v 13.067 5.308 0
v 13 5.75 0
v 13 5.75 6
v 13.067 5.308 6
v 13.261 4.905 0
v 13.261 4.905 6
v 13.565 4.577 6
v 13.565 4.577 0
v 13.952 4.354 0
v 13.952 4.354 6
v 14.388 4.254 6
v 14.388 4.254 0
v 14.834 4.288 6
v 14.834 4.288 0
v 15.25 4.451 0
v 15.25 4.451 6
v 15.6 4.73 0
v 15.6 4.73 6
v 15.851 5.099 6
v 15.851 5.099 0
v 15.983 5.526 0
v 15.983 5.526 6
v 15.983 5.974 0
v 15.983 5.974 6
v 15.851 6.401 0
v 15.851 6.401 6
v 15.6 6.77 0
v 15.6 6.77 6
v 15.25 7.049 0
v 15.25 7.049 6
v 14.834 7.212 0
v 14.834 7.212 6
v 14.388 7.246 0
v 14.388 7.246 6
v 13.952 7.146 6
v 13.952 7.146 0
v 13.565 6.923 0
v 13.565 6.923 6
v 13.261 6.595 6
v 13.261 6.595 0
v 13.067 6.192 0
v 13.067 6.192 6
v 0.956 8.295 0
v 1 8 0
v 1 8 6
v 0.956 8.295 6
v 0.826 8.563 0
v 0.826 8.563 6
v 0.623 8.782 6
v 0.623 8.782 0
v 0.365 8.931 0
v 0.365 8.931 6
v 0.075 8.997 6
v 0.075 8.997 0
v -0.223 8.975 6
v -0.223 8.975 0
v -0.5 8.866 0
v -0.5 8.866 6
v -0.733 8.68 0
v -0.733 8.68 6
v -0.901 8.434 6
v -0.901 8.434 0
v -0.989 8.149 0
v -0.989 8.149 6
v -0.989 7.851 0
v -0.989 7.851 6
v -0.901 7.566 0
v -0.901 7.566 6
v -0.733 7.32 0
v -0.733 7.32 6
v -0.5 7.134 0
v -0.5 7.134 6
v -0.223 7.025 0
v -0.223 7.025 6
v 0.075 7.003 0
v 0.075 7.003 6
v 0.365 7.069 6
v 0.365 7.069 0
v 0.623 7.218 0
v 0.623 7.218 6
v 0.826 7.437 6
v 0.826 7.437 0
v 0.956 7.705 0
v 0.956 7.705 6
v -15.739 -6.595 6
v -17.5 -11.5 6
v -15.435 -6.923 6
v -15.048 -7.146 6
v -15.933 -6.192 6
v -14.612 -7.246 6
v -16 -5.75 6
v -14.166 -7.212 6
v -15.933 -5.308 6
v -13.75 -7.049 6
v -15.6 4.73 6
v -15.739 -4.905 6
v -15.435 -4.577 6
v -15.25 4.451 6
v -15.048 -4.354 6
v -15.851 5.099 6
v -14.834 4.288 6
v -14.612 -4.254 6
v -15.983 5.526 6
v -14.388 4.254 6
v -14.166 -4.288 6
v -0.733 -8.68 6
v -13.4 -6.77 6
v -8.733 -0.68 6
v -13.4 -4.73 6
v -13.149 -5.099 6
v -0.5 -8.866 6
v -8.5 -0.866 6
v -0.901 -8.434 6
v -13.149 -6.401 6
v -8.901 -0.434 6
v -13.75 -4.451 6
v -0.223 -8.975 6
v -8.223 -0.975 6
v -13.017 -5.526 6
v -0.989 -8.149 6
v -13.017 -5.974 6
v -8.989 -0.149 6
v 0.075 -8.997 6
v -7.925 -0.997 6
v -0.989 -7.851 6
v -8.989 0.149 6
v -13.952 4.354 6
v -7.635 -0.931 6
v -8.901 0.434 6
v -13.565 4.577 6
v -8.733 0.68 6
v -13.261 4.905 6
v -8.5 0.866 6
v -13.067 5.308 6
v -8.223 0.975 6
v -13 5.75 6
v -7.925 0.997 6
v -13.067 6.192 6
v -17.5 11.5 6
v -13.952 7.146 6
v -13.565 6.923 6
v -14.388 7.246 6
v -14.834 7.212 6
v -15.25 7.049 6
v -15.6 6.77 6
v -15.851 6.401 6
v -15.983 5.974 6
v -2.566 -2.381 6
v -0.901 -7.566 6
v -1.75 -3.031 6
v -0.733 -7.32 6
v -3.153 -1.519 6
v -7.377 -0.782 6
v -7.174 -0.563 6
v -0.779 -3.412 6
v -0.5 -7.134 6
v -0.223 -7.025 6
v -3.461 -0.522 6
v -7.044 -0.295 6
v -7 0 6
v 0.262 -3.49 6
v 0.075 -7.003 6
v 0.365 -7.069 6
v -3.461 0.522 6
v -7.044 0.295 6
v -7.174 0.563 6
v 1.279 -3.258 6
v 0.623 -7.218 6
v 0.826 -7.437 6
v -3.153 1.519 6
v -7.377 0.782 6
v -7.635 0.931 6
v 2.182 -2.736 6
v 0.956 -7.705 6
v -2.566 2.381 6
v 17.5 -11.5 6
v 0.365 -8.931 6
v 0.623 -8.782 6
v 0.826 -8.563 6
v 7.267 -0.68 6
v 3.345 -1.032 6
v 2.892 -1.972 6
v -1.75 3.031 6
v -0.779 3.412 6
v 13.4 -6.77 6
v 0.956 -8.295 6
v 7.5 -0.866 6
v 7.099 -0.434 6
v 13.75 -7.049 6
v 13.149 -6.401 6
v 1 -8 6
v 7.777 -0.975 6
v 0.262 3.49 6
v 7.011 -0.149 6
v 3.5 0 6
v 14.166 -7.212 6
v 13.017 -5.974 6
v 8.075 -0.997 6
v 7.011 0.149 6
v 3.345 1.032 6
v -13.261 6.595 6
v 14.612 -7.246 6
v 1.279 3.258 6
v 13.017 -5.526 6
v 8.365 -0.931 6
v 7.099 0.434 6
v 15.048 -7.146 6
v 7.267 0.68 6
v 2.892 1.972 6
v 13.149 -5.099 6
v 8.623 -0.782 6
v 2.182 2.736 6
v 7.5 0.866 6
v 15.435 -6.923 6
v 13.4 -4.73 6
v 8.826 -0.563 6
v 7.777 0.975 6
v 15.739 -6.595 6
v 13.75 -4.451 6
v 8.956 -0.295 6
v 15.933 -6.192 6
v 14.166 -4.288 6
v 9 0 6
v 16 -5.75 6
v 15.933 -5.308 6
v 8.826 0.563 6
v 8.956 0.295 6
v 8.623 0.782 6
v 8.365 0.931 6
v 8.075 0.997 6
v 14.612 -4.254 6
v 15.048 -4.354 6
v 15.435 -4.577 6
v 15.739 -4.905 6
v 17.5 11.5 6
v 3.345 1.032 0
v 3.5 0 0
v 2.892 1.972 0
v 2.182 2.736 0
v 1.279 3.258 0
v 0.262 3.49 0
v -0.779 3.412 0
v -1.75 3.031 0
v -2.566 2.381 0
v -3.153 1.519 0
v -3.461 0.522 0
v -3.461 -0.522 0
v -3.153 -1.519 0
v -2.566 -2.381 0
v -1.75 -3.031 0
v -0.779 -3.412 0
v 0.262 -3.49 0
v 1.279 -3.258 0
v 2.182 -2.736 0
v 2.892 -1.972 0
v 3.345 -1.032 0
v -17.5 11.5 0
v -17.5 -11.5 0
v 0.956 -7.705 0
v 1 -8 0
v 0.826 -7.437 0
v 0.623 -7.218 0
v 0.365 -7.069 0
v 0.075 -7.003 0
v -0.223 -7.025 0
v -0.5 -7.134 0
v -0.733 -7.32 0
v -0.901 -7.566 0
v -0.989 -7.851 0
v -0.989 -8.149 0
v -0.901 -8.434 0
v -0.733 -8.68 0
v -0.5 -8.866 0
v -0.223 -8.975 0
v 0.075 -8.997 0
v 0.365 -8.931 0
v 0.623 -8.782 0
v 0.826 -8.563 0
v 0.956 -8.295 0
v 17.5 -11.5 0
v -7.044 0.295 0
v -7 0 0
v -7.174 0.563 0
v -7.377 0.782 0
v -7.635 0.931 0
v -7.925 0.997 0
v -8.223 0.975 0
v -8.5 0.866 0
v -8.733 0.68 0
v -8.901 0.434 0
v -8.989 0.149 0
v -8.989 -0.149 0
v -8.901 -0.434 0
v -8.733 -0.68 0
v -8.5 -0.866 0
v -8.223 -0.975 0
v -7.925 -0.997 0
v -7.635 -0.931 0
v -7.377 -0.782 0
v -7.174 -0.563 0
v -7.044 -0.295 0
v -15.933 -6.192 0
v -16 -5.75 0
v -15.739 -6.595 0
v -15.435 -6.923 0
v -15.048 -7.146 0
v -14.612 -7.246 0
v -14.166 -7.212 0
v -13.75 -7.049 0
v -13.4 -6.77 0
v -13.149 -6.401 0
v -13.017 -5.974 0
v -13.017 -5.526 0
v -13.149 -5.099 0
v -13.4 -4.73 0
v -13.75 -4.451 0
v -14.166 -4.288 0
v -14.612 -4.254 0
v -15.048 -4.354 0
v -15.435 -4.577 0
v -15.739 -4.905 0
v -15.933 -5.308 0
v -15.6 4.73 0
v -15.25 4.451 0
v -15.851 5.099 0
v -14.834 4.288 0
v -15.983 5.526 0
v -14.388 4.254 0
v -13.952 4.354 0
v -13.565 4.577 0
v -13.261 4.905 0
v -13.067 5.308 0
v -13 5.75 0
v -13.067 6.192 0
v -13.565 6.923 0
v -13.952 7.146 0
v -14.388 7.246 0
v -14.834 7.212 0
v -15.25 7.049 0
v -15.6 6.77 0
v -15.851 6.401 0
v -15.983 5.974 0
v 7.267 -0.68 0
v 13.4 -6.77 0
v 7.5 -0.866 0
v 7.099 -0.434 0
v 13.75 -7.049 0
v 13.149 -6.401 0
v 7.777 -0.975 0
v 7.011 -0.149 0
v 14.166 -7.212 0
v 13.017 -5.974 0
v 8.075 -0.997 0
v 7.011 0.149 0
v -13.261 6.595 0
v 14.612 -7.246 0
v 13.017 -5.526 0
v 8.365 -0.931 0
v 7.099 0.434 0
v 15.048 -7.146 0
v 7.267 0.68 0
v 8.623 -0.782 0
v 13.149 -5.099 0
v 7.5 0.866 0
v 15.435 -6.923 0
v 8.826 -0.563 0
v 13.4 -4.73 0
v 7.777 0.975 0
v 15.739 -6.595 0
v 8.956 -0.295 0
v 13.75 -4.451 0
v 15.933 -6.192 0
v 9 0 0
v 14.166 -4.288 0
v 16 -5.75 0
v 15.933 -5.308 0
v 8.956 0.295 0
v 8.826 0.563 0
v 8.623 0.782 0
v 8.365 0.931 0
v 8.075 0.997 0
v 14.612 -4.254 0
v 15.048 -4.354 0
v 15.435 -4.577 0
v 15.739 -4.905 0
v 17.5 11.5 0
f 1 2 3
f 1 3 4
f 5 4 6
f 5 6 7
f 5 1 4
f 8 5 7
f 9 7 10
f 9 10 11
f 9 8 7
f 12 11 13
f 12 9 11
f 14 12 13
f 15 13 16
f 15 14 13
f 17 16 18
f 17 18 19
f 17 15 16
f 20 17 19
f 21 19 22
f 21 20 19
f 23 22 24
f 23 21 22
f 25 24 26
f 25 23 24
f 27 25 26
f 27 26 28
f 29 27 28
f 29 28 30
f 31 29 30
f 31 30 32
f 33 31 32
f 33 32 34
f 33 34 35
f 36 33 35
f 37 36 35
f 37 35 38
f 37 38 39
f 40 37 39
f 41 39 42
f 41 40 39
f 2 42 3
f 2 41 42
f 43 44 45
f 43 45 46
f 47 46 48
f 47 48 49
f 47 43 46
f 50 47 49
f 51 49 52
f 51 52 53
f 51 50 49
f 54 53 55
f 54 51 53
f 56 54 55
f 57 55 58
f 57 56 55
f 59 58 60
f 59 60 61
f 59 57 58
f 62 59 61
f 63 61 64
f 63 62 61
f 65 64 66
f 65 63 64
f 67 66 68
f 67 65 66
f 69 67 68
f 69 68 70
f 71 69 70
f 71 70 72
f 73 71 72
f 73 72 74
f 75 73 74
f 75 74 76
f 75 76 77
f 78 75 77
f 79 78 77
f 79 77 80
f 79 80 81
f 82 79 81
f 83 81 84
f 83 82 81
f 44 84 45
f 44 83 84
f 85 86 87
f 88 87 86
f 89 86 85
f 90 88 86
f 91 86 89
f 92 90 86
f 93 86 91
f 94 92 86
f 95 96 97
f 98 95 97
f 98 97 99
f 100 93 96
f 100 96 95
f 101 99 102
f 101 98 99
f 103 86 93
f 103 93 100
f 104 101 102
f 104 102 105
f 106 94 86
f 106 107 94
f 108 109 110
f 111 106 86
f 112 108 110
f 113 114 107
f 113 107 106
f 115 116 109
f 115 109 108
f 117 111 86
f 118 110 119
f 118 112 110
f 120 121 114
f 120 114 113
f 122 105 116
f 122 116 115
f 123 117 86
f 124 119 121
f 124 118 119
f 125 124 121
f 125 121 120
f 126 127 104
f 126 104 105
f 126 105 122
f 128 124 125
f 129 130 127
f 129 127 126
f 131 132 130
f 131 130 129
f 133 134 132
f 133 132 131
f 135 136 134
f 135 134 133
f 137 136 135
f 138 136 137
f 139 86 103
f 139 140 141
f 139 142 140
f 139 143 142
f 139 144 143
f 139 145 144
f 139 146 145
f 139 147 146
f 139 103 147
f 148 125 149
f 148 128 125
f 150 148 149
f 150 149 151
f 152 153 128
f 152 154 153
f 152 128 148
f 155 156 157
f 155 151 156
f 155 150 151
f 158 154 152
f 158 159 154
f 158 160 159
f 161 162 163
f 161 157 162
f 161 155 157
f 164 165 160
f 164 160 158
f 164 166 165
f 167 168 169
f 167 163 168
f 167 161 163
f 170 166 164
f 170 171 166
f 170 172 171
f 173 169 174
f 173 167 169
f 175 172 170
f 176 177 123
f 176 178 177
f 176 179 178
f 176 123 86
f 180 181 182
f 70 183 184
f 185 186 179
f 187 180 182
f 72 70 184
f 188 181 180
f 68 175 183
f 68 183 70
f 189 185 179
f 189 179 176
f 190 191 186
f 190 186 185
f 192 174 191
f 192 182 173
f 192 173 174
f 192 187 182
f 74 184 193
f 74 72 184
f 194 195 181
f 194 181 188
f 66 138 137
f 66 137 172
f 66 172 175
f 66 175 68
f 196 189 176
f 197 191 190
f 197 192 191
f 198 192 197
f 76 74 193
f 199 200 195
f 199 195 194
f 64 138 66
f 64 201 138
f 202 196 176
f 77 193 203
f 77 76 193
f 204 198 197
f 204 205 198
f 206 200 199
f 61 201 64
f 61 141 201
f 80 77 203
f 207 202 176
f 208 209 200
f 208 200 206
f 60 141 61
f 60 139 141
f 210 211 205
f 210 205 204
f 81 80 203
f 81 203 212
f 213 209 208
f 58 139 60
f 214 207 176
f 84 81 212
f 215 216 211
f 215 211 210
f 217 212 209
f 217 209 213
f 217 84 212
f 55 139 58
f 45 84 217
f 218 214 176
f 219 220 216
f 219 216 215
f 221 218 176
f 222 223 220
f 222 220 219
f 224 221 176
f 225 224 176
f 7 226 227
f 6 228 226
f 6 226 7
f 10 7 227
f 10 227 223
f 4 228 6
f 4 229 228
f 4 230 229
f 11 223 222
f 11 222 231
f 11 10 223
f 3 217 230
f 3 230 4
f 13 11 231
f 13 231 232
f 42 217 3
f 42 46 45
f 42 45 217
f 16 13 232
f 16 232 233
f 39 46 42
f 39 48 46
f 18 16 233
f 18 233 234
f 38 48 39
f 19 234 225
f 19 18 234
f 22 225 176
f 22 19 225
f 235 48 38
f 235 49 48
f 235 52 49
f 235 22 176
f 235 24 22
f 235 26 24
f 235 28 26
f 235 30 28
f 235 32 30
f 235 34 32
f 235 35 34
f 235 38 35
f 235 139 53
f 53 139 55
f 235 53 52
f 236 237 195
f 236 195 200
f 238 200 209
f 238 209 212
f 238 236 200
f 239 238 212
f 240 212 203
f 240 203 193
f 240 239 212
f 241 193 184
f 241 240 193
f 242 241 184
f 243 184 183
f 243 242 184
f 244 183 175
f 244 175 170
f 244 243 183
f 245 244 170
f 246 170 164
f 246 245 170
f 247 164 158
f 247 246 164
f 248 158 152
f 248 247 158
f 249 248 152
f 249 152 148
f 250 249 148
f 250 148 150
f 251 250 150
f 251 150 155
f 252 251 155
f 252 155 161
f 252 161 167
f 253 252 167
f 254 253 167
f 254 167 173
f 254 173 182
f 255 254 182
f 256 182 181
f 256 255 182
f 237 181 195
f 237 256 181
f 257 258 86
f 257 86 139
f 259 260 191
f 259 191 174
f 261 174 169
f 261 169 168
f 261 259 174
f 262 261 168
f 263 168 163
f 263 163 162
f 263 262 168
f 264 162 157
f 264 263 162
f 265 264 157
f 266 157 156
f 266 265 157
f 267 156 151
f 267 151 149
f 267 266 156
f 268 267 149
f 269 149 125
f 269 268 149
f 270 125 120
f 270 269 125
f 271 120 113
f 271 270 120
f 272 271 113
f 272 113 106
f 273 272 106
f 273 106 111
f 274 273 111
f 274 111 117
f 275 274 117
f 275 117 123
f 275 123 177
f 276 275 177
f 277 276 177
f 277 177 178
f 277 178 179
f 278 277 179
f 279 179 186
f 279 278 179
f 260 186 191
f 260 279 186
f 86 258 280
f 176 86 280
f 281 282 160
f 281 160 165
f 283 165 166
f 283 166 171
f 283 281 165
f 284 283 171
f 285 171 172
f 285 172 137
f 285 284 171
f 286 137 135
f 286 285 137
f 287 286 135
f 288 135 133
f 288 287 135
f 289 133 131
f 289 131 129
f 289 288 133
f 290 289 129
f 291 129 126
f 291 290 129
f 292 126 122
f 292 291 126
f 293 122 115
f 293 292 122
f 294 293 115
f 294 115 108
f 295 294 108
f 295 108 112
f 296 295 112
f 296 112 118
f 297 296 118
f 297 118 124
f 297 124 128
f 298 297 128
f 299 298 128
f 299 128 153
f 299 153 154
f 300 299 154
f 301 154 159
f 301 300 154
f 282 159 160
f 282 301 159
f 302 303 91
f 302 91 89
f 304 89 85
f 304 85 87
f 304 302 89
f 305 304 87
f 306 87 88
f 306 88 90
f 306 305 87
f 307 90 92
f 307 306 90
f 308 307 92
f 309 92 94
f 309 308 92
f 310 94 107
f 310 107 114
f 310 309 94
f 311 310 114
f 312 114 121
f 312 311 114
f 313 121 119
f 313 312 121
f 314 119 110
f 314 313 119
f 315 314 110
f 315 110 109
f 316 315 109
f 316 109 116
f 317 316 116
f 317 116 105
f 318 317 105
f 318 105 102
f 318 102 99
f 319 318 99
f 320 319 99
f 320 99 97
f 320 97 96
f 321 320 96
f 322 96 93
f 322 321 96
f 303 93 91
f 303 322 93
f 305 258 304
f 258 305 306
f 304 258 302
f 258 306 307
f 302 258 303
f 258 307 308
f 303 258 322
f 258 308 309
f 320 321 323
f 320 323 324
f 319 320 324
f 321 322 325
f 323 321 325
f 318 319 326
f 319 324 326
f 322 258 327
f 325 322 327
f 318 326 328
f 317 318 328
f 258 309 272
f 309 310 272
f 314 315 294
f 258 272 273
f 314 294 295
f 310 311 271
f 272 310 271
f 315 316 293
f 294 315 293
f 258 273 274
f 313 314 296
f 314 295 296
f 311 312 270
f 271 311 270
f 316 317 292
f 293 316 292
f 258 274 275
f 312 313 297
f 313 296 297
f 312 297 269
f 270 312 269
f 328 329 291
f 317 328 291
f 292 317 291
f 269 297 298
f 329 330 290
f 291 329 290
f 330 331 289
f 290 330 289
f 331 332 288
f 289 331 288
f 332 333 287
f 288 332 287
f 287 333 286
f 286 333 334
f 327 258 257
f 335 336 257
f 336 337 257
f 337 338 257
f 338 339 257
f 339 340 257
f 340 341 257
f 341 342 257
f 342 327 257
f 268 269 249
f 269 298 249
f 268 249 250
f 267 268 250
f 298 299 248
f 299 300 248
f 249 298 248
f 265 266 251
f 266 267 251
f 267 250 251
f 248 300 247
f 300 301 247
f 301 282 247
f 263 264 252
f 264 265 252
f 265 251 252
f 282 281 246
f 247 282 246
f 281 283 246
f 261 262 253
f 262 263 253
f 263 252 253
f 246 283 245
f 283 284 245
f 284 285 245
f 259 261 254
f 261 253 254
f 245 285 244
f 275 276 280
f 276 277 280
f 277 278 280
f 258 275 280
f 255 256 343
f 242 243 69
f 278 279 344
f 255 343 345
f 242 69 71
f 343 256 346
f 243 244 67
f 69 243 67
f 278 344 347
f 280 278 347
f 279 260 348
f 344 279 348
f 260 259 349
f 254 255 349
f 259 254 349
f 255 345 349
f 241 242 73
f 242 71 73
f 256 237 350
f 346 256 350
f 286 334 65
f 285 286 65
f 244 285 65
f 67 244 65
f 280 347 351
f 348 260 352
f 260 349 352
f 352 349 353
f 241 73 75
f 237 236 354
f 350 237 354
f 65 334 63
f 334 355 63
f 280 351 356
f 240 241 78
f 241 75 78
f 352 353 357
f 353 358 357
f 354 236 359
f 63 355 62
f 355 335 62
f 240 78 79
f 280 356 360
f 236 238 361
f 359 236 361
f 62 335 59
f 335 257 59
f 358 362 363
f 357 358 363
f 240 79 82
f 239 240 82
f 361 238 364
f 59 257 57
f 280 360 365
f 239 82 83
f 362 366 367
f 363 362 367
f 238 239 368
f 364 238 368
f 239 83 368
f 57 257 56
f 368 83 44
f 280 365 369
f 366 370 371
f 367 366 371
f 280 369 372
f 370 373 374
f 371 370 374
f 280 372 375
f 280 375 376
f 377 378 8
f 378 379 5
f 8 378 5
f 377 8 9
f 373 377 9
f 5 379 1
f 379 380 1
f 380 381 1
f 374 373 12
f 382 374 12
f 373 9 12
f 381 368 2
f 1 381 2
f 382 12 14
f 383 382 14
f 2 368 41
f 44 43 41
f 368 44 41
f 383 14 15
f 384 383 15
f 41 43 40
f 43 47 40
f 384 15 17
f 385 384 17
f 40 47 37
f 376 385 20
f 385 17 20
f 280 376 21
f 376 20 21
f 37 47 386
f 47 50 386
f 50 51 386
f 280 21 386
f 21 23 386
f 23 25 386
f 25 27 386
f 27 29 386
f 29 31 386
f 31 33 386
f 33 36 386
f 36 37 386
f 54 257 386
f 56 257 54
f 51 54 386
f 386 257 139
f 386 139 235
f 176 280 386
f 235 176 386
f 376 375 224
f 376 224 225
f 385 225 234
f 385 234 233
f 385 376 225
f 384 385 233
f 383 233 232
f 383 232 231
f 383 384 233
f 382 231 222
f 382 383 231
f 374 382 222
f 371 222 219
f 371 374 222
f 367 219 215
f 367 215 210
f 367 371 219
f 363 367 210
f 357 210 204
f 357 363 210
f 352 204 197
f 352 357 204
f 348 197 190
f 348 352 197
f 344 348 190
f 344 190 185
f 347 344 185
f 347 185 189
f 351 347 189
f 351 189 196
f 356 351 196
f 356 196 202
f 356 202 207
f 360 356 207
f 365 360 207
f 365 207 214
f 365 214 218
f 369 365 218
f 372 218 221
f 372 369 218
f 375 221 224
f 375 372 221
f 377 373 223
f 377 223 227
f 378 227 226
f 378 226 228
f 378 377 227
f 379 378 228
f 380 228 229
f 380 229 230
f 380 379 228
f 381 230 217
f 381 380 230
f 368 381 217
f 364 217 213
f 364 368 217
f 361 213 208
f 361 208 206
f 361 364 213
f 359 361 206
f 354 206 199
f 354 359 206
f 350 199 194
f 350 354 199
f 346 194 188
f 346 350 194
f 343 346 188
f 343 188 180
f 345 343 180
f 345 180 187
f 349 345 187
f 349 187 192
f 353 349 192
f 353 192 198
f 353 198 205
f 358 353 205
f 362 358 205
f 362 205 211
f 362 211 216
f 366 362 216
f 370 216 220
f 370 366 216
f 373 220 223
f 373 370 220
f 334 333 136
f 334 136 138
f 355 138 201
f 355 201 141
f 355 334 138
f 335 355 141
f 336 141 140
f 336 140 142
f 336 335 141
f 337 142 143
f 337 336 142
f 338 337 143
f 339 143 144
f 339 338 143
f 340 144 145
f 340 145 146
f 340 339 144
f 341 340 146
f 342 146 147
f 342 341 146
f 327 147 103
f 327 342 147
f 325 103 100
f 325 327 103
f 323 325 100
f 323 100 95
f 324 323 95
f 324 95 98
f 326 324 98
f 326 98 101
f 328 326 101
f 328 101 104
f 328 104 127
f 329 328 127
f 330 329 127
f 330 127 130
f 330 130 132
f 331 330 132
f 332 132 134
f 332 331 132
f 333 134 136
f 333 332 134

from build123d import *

# Parameters (mm, degrees)
ESQUISSE1_W        = 35
ESQUISSE1_H        = 23
ESQUISSE1_R        = 3.5
ESQUISSE1_R_2      = 1
ESQUISSE1_R_3      = 1.5
BOSS_EXTRU_1_DEPTH = 6


with BuildPart() as part:
    # Esquisse1 → Boss.-Extru.1 (new body)
    with BuildSketch(Plane.XY):
        Rectangle(ESQUISSE1_W, ESQUISSE1_H)
        Circle(ESQUISSE1_R, mode=Mode.SUBTRACT)
        with Locations((0, 8)):
            Circle(ESQUISSE1_R_2, mode=Mode.SUBTRACT)
        with Locations((8, 0)):
            Circle(ESQUISSE1_R_2, mode=Mode.SUBTRACT)
        with Locations((0, -8)):
            Circle(ESQUISSE1_R_2, mode=Mode.SUBTRACT)
        with Locations((-8, 0)):
            Circle(ESQUISSE1_R_2, mode=Mode.SUBTRACT)
        with Locations((-14.5, 5.75)):
            Circle(ESQUISSE1_R_3, mode=Mode.SUBTRACT)
        with Locations(Location((-14.5, -5.75, 0), (0, 0, 180))):
            Circle(ESQUISSE1_R_3, mode=Mode.SUBTRACT)
        with Locations((14.5, -5.75)):
            Circle(ESQUISSE1_R_3, mode=Mode.SUBTRACT)
        with Locations(Location((14.5, 5.75, 0), (0, 0, 180))):
            Circle(ESQUISSE1_R_3, mode=Mode.SUBTRACT)
    extrude(amount=BOSS_EXTRU_1_DEPTH)


solid = part.part
